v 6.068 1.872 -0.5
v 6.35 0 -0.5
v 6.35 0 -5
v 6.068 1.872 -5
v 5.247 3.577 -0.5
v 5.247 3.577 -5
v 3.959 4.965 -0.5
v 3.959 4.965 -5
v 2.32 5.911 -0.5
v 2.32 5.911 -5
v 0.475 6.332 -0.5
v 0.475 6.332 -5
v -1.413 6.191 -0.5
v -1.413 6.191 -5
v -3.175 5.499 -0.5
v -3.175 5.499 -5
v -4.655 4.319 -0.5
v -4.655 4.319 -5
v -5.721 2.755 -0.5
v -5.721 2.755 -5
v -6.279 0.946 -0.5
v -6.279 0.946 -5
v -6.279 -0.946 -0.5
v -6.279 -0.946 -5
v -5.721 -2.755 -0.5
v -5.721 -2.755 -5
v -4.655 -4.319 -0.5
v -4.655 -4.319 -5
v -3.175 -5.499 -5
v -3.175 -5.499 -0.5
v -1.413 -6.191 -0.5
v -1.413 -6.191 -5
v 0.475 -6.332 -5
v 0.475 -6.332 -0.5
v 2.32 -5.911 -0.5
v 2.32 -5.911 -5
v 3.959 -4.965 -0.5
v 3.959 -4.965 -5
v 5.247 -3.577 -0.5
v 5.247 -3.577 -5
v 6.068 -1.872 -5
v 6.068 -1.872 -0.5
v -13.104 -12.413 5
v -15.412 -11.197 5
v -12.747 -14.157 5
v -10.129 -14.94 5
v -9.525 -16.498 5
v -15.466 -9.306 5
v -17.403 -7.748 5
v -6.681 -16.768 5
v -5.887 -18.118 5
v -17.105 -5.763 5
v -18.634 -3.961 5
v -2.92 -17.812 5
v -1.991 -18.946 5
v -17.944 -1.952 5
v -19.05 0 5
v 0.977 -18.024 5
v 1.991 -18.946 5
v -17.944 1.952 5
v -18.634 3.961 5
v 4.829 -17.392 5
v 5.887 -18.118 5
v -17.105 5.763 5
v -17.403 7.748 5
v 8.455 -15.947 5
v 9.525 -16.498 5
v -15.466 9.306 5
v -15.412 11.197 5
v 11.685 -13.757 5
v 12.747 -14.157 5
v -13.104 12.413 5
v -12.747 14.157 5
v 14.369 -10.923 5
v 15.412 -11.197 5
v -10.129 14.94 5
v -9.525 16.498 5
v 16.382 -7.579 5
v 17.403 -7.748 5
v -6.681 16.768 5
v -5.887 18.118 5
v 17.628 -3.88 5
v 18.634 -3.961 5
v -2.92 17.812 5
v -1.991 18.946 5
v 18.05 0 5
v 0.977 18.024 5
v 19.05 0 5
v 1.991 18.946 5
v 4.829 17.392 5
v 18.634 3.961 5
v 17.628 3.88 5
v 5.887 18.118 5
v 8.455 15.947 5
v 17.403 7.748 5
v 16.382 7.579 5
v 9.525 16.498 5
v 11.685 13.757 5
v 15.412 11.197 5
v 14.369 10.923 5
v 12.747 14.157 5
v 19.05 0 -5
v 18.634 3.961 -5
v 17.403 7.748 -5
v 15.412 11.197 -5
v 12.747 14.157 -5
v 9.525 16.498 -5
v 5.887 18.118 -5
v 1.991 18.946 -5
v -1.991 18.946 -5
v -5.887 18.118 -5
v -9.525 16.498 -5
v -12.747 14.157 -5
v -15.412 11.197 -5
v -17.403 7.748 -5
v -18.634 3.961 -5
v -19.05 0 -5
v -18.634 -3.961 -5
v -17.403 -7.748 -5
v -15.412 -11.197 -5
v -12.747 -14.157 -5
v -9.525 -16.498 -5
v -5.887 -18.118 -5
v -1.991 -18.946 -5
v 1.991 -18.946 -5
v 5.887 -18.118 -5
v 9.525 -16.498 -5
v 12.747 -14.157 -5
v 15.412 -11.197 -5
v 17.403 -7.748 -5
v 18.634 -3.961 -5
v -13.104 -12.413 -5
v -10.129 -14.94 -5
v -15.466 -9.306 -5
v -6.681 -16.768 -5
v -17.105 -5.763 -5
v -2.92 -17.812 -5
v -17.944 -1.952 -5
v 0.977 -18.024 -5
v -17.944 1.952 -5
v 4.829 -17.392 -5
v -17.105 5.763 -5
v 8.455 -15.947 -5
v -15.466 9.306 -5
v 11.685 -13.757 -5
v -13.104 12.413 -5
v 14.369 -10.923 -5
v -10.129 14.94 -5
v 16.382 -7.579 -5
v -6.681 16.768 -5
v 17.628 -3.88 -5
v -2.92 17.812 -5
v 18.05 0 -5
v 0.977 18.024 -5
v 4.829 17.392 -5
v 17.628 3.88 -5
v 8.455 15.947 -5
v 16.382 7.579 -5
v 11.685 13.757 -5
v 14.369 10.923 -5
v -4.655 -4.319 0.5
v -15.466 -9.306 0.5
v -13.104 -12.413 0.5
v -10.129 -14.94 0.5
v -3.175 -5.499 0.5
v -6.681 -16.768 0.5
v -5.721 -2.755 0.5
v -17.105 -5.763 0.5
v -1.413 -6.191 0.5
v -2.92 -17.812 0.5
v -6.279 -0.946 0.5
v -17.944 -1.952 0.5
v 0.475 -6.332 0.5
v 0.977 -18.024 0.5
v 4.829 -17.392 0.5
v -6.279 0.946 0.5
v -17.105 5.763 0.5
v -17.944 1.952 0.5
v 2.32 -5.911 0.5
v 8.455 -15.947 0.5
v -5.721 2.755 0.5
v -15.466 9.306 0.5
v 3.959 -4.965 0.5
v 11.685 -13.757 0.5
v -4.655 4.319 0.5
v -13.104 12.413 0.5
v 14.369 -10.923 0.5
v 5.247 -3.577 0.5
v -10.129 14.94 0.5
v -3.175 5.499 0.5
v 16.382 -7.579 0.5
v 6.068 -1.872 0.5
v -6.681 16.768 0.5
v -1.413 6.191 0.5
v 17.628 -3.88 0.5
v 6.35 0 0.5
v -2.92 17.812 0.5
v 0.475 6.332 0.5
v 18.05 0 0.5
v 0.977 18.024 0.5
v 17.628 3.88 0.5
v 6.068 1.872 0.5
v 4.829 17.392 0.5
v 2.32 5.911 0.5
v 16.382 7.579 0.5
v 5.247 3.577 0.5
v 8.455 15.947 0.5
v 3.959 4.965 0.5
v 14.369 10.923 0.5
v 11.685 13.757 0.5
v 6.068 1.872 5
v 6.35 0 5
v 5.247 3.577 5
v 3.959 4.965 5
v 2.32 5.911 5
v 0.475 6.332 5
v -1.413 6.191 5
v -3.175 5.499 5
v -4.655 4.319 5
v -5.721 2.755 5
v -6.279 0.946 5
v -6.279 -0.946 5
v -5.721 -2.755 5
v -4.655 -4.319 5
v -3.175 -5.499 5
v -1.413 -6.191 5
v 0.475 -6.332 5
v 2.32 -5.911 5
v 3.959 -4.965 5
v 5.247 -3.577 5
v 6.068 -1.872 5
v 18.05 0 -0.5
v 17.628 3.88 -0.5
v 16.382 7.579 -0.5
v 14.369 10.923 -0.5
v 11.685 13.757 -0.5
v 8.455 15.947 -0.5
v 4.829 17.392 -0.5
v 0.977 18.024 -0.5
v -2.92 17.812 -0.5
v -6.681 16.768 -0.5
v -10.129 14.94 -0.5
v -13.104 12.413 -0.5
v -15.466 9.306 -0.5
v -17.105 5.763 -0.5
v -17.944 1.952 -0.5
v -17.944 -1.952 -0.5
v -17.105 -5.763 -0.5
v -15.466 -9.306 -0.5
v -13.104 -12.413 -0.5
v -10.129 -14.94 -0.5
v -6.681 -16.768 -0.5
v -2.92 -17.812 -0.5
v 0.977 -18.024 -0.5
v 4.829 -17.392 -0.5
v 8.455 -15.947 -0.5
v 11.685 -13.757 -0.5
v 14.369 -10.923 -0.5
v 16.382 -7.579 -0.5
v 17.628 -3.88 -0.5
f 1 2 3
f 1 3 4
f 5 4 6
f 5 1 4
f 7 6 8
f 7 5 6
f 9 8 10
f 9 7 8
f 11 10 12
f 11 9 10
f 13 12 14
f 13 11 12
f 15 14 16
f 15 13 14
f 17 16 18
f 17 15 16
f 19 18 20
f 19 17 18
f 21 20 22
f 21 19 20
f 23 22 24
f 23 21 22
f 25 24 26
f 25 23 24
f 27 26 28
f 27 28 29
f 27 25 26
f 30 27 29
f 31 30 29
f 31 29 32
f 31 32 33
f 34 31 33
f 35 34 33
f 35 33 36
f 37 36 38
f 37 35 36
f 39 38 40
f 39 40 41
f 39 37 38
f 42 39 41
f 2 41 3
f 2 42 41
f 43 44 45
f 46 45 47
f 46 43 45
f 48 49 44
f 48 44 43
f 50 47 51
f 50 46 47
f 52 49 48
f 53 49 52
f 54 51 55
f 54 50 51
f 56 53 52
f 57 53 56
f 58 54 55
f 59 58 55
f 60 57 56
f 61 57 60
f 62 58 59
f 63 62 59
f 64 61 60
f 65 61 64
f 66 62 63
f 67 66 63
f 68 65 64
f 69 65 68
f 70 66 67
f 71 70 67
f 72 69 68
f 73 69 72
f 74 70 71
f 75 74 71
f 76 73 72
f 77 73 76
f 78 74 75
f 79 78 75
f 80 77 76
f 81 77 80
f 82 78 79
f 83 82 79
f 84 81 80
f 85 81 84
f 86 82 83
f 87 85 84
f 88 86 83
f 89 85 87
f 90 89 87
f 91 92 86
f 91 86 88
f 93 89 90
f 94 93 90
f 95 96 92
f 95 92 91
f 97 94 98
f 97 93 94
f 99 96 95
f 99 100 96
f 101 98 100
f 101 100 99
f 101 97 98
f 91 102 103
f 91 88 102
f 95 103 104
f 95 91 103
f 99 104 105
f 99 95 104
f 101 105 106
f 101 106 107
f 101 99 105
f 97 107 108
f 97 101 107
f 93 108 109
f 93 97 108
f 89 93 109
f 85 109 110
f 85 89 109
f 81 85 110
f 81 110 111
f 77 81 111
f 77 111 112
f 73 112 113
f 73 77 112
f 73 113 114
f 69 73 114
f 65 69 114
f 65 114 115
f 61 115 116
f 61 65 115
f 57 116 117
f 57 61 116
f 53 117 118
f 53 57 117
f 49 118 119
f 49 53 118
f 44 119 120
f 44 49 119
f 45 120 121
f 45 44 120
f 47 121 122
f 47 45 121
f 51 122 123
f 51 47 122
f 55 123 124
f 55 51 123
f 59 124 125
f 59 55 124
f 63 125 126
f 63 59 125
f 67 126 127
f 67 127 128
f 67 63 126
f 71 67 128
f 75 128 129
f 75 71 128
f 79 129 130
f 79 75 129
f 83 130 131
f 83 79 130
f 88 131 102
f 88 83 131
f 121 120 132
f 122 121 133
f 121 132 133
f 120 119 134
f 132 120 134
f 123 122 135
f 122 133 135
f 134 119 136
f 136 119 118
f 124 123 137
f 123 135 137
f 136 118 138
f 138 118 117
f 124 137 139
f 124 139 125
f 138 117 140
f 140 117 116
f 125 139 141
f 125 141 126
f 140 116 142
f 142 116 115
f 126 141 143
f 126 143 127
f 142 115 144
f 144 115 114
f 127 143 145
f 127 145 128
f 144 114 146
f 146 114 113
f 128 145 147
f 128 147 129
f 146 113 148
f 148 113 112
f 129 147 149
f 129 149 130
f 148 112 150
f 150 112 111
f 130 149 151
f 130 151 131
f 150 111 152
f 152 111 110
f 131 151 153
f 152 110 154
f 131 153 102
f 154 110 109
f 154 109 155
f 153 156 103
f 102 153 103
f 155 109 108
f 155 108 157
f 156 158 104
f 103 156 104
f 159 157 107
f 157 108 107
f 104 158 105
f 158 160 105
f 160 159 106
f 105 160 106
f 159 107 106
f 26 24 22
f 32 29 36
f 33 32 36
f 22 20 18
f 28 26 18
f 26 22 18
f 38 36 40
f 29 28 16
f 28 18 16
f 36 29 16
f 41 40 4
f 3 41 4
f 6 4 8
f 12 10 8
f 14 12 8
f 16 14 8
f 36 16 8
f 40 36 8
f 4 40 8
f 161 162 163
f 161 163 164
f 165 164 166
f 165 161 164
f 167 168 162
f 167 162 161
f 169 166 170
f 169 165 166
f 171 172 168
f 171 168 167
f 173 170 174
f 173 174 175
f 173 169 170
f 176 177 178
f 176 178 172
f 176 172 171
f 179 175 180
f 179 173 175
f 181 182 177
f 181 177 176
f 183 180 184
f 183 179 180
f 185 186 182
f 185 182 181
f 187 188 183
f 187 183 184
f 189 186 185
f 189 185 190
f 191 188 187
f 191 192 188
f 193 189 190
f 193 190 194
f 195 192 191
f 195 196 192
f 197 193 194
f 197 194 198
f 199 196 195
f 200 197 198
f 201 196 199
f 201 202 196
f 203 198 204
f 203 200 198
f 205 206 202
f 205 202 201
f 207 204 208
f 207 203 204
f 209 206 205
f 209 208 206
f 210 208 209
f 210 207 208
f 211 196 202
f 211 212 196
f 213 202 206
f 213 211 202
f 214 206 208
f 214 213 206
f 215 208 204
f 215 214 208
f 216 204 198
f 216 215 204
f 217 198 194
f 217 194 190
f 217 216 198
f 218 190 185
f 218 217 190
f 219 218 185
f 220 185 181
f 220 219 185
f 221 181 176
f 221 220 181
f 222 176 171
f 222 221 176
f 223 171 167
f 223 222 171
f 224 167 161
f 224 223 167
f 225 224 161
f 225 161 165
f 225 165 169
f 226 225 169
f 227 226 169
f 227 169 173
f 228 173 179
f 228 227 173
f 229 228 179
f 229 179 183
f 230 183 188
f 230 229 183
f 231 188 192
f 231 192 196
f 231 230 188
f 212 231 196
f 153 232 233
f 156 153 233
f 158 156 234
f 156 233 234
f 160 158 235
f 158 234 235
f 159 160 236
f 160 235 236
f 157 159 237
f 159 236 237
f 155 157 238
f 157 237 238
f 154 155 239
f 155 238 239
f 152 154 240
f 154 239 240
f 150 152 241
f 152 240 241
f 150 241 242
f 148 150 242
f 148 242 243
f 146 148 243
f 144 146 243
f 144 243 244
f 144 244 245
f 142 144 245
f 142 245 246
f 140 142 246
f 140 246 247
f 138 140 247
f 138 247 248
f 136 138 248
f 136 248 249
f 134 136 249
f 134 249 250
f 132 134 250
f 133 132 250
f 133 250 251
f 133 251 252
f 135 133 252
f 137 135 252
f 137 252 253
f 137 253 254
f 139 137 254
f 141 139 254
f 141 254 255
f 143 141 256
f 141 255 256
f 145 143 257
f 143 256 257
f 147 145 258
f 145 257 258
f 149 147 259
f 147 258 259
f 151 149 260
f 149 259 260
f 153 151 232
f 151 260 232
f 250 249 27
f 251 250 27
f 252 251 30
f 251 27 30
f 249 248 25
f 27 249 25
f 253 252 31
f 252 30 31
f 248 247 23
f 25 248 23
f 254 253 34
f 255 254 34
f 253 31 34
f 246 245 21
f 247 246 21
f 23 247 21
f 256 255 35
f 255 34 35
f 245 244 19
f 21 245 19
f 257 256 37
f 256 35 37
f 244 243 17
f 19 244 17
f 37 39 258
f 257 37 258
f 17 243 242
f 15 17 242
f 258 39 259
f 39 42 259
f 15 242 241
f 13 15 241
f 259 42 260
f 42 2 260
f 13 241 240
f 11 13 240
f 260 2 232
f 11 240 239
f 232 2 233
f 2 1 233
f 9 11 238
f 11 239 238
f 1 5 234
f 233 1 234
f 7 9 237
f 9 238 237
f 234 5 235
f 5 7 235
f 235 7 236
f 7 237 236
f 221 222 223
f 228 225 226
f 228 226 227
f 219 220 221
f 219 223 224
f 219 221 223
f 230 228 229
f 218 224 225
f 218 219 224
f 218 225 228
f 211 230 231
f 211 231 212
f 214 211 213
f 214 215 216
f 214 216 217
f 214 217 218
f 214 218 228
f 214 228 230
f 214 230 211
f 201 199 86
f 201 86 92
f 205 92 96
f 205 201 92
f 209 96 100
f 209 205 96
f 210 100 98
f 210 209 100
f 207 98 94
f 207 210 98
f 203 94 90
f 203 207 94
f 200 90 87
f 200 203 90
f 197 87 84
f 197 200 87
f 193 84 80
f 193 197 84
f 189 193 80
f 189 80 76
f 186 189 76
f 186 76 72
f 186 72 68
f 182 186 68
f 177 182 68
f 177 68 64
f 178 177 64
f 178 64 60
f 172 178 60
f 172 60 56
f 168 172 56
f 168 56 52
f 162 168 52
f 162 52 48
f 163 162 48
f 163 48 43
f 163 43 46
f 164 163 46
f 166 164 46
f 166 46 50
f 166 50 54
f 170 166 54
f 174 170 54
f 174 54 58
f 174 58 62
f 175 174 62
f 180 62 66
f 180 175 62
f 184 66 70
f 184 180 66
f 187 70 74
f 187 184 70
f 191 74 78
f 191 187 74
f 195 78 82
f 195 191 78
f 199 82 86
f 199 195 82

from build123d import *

# Parameters (mm, degrees)
SKETCH1_R           = 18.05
SKETCH1_R_2         = 6.35
BOSS_EXTRUDE1_DEPTH = 0.5
SKETCH1_3_R         = 19.05
SKETCH1_3_R_2       = 18.05
SKETCH1_3_R_3       = 6.35
BOSS_EXTRUDE2_DEPTH = 5


with BuildPart() as part:
    # Sketch1 → Boss-Extrude1 (new, symmetric)
    with BuildSketch(Plane.XY):
        Circle(SKETCH1_R)
        Circle(SKETCH1_R_2, mode=Mode.SUBTRACT)
    extrude(amount=BOSS_EXTRUDE1_DEPTH, both=True)

    # Sketch1<3> → Boss-Extrude2 (add, symmetric)
    # profile 1 of 2: a face of its own
    with BuildSketch(Plane.XY):
        Circle(SKETCH1_3_R)
        Circle(SKETCH1_3_R_2, mode=Mode.SUBTRACT)
    # profile 2 of 2: a face of its own
    with BuildSketch(Plane.XY):
        Circle(SKETCH1_3_R_3)
    extrude(amount=BOSS_EXTRUDE2_DEPTH, both=True)


solid = part.part
